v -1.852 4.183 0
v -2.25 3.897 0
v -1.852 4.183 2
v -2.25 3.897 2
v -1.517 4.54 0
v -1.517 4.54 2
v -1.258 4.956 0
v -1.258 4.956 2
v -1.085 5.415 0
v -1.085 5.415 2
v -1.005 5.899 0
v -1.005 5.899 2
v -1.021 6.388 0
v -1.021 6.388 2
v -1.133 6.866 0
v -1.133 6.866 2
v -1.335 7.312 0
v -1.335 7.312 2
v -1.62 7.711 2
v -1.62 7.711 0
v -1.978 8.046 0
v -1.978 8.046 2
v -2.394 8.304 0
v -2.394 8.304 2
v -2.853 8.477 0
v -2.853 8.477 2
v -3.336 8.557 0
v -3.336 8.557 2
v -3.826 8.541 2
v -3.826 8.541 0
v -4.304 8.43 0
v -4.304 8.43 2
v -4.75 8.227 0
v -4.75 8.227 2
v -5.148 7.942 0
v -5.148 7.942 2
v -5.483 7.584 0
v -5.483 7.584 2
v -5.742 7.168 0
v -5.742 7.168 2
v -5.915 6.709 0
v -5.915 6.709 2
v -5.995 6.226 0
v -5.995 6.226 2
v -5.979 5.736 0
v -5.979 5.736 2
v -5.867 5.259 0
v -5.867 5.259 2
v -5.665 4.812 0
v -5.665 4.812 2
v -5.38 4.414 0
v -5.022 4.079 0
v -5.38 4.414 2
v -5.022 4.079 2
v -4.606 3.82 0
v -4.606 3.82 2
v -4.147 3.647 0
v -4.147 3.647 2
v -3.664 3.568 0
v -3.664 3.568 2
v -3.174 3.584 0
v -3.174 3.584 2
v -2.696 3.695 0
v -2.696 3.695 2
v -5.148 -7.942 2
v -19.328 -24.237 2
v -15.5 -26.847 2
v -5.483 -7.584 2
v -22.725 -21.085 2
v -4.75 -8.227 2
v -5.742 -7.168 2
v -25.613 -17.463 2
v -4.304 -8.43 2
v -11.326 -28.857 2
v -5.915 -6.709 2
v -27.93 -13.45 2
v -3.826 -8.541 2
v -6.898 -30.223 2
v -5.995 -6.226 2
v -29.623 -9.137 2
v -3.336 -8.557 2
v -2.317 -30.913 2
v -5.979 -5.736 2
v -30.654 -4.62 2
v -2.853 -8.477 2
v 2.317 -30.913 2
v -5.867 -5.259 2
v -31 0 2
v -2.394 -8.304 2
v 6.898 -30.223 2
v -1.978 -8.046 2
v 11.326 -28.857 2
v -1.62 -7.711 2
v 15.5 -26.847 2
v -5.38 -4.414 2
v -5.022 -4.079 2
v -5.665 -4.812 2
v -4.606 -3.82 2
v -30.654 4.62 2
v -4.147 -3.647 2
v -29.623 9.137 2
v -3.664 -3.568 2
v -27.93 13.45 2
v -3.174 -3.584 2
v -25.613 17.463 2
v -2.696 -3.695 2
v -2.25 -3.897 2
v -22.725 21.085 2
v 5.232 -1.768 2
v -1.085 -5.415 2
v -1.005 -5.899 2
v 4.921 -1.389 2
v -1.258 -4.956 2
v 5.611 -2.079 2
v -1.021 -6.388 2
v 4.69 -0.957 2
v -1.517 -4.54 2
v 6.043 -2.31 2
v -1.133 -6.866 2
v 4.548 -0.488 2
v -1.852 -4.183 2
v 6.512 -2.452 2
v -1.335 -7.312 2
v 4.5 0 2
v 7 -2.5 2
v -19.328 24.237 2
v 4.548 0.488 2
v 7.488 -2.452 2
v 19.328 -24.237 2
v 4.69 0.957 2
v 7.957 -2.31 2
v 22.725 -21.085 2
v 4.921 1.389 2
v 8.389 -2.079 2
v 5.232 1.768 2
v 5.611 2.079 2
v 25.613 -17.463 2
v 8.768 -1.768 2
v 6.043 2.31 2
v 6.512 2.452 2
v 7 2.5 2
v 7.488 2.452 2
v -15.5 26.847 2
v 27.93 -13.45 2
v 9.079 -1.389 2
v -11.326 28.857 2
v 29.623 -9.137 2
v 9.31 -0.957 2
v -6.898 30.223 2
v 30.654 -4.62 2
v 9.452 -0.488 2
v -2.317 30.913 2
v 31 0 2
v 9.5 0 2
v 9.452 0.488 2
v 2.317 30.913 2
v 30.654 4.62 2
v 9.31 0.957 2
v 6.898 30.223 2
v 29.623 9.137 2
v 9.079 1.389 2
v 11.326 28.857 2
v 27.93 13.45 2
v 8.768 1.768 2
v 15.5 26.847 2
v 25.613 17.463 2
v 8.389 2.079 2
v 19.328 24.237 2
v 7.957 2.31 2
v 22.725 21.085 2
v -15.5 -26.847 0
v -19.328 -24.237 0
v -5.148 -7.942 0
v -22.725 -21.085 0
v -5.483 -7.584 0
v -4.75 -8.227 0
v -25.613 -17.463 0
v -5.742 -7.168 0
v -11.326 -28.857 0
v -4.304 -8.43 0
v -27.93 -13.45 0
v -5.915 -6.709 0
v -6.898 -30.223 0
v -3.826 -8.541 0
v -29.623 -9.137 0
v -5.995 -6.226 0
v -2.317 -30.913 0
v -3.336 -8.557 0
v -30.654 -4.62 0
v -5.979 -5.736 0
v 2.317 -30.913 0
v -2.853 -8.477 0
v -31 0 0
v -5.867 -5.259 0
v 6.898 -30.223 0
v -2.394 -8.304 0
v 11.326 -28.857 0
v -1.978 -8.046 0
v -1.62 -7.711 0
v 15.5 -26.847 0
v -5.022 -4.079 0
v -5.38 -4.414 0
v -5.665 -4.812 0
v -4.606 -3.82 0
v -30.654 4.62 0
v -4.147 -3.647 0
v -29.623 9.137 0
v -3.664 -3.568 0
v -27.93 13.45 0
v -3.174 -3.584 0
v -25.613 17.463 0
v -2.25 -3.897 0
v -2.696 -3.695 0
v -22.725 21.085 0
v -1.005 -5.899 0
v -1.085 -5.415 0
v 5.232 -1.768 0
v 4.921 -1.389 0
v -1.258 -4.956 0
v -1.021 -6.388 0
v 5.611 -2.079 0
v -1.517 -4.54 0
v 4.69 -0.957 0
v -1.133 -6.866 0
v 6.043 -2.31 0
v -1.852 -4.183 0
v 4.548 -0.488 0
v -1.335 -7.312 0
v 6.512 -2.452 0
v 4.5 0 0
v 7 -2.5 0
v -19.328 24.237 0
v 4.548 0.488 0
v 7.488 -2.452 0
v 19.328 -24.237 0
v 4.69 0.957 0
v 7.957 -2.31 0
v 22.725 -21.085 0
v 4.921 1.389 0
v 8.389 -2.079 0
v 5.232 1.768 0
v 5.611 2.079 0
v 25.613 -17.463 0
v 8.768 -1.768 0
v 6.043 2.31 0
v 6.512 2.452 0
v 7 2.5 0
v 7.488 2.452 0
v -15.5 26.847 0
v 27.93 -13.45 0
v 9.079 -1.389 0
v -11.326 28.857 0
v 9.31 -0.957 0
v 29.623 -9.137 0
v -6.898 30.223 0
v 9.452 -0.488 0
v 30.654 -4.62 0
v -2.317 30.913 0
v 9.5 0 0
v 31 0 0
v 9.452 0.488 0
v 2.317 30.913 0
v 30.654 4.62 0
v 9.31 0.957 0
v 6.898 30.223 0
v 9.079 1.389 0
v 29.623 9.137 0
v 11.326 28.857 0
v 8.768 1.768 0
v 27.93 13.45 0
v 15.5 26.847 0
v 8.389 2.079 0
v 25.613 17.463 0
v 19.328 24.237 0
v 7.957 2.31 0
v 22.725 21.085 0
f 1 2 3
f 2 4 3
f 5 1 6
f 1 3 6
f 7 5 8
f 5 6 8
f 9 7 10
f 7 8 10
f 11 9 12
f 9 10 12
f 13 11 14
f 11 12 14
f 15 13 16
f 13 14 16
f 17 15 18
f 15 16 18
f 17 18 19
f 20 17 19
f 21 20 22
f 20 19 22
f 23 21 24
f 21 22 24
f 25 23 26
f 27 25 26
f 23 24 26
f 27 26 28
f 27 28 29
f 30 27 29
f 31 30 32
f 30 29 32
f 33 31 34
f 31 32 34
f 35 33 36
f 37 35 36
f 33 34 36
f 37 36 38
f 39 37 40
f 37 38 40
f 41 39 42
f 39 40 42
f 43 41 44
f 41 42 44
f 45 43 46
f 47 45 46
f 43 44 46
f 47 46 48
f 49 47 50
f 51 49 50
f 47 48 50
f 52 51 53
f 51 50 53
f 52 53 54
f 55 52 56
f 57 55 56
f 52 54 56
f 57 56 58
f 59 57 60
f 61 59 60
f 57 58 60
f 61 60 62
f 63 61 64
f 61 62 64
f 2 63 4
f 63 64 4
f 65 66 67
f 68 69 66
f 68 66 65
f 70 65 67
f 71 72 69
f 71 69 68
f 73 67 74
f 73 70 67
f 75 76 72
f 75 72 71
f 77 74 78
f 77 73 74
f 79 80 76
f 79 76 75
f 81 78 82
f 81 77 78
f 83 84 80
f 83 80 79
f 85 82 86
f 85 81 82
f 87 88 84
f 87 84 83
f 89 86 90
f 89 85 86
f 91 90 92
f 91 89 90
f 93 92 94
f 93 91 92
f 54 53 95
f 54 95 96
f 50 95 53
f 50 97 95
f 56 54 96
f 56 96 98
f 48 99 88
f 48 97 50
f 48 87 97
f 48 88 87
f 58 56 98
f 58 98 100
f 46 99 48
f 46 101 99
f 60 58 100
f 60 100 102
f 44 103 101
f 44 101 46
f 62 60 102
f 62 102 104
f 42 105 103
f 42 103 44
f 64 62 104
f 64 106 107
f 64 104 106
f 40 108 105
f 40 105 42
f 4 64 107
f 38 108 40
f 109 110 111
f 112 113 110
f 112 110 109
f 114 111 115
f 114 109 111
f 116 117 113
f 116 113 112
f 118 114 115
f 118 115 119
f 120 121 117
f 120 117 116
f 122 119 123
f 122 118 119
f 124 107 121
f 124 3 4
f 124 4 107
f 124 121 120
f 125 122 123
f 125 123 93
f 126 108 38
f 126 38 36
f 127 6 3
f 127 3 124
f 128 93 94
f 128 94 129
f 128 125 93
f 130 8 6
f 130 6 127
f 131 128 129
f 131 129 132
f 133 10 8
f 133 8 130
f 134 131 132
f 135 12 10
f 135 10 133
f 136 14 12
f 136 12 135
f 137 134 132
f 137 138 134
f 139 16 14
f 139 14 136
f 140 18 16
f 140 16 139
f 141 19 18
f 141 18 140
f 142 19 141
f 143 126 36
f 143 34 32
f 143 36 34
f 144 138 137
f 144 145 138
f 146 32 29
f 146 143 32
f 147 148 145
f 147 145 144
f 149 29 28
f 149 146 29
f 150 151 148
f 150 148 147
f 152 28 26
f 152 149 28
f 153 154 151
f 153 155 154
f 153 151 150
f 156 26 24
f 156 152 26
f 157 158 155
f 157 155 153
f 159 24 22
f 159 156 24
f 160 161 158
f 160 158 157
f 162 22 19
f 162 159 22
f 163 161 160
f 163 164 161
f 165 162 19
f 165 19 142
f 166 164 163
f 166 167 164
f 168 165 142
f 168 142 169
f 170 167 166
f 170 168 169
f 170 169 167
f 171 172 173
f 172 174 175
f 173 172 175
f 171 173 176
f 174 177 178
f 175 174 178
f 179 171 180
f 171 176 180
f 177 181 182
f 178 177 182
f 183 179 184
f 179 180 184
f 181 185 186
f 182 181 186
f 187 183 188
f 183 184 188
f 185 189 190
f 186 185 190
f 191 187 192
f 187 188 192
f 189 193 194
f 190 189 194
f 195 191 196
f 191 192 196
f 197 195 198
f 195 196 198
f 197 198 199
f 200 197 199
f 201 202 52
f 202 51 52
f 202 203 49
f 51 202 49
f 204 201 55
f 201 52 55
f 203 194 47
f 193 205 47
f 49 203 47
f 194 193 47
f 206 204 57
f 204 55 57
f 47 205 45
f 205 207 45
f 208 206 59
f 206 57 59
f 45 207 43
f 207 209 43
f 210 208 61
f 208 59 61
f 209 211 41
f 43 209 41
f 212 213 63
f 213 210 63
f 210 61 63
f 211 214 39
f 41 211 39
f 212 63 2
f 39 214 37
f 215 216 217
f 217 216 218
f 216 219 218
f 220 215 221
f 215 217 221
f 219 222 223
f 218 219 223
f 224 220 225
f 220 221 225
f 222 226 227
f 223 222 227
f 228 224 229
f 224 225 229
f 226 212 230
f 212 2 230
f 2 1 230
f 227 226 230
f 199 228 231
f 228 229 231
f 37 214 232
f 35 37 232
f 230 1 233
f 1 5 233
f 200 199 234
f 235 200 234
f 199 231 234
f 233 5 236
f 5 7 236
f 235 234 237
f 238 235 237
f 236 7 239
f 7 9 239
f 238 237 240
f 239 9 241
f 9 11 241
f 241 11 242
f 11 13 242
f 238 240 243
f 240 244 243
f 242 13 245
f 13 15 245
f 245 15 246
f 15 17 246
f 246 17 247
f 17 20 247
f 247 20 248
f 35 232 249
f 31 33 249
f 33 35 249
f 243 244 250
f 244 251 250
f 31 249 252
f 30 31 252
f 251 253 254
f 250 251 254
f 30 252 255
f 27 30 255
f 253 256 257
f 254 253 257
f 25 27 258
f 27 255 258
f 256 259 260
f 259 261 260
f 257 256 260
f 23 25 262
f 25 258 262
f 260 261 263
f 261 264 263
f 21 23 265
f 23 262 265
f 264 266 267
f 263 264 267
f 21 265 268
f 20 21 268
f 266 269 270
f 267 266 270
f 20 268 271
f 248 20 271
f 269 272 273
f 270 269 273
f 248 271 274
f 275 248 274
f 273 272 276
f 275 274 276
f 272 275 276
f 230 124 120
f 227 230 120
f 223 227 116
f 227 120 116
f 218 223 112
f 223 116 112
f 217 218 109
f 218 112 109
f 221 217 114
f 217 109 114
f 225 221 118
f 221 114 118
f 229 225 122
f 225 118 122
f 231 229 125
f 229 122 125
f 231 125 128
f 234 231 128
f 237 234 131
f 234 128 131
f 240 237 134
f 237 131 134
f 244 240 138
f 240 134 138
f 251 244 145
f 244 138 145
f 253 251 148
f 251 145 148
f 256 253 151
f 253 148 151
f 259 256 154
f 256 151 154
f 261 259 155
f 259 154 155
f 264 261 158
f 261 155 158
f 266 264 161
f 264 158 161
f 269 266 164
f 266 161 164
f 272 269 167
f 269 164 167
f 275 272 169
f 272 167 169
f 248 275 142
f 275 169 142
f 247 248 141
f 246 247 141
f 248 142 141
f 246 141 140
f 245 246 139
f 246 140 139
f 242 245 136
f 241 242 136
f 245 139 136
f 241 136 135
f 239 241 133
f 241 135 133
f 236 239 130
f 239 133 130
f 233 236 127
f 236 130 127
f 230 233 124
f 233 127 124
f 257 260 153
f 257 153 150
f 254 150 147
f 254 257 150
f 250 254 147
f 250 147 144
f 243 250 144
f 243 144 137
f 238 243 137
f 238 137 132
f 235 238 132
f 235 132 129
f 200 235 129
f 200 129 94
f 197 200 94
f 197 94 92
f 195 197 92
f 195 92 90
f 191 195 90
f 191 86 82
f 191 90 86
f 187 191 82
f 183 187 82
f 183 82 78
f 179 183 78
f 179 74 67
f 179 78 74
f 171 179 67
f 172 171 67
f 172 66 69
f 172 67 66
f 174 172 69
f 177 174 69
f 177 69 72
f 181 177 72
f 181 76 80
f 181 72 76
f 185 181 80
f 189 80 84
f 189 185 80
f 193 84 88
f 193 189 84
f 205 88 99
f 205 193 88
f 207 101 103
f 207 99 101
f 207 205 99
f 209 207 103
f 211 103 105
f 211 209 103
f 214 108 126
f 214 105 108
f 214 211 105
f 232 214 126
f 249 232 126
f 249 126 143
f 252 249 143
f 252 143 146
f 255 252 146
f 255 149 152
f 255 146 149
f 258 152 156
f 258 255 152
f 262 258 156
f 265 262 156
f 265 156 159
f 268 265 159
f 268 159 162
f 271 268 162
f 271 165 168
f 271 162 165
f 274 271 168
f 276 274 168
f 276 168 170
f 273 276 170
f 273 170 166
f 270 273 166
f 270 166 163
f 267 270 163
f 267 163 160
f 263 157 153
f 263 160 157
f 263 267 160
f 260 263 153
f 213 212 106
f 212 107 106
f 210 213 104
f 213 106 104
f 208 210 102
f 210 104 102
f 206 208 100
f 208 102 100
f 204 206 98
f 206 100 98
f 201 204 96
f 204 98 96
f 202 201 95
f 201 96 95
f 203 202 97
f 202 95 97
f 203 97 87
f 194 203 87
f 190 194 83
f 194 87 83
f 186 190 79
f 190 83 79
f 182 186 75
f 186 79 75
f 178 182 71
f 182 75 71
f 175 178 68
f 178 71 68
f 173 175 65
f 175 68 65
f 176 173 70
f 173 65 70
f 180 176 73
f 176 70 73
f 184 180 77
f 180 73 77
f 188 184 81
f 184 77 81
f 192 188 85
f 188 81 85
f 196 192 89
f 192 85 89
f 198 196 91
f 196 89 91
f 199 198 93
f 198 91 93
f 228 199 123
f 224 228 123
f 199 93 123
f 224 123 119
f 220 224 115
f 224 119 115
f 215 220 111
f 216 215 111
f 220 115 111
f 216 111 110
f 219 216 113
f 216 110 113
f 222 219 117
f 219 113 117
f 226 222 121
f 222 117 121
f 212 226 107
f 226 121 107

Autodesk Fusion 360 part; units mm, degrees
sketch "Sketch1" plane through (0, 0, 0) normal (0, 0, 1) x (1, 0, 0)
  circle A0 centre (0, 0) radius 31
  dimension "d1" = 62
extrude "Extrude1" add sketch "Sketch1" along normal blind 2
sketch "Sketch2" plane through (0, 0, 2) normal (0, 0, 1) x (-1, 0, 0)
  circle A0 centre (0, 0) radius 31
  circle A1 centre (-7, 0) radius 2.5
  dimension "d5" = 5
extrude "Extrude2" cut sketch "Sketch2" against normal blind 10 contours A1
pattern_circular "C-Pattern1" count 3 over 360 about axis through (0, 0, 1.75) along (0, 0, 1) of "Extrude2"
